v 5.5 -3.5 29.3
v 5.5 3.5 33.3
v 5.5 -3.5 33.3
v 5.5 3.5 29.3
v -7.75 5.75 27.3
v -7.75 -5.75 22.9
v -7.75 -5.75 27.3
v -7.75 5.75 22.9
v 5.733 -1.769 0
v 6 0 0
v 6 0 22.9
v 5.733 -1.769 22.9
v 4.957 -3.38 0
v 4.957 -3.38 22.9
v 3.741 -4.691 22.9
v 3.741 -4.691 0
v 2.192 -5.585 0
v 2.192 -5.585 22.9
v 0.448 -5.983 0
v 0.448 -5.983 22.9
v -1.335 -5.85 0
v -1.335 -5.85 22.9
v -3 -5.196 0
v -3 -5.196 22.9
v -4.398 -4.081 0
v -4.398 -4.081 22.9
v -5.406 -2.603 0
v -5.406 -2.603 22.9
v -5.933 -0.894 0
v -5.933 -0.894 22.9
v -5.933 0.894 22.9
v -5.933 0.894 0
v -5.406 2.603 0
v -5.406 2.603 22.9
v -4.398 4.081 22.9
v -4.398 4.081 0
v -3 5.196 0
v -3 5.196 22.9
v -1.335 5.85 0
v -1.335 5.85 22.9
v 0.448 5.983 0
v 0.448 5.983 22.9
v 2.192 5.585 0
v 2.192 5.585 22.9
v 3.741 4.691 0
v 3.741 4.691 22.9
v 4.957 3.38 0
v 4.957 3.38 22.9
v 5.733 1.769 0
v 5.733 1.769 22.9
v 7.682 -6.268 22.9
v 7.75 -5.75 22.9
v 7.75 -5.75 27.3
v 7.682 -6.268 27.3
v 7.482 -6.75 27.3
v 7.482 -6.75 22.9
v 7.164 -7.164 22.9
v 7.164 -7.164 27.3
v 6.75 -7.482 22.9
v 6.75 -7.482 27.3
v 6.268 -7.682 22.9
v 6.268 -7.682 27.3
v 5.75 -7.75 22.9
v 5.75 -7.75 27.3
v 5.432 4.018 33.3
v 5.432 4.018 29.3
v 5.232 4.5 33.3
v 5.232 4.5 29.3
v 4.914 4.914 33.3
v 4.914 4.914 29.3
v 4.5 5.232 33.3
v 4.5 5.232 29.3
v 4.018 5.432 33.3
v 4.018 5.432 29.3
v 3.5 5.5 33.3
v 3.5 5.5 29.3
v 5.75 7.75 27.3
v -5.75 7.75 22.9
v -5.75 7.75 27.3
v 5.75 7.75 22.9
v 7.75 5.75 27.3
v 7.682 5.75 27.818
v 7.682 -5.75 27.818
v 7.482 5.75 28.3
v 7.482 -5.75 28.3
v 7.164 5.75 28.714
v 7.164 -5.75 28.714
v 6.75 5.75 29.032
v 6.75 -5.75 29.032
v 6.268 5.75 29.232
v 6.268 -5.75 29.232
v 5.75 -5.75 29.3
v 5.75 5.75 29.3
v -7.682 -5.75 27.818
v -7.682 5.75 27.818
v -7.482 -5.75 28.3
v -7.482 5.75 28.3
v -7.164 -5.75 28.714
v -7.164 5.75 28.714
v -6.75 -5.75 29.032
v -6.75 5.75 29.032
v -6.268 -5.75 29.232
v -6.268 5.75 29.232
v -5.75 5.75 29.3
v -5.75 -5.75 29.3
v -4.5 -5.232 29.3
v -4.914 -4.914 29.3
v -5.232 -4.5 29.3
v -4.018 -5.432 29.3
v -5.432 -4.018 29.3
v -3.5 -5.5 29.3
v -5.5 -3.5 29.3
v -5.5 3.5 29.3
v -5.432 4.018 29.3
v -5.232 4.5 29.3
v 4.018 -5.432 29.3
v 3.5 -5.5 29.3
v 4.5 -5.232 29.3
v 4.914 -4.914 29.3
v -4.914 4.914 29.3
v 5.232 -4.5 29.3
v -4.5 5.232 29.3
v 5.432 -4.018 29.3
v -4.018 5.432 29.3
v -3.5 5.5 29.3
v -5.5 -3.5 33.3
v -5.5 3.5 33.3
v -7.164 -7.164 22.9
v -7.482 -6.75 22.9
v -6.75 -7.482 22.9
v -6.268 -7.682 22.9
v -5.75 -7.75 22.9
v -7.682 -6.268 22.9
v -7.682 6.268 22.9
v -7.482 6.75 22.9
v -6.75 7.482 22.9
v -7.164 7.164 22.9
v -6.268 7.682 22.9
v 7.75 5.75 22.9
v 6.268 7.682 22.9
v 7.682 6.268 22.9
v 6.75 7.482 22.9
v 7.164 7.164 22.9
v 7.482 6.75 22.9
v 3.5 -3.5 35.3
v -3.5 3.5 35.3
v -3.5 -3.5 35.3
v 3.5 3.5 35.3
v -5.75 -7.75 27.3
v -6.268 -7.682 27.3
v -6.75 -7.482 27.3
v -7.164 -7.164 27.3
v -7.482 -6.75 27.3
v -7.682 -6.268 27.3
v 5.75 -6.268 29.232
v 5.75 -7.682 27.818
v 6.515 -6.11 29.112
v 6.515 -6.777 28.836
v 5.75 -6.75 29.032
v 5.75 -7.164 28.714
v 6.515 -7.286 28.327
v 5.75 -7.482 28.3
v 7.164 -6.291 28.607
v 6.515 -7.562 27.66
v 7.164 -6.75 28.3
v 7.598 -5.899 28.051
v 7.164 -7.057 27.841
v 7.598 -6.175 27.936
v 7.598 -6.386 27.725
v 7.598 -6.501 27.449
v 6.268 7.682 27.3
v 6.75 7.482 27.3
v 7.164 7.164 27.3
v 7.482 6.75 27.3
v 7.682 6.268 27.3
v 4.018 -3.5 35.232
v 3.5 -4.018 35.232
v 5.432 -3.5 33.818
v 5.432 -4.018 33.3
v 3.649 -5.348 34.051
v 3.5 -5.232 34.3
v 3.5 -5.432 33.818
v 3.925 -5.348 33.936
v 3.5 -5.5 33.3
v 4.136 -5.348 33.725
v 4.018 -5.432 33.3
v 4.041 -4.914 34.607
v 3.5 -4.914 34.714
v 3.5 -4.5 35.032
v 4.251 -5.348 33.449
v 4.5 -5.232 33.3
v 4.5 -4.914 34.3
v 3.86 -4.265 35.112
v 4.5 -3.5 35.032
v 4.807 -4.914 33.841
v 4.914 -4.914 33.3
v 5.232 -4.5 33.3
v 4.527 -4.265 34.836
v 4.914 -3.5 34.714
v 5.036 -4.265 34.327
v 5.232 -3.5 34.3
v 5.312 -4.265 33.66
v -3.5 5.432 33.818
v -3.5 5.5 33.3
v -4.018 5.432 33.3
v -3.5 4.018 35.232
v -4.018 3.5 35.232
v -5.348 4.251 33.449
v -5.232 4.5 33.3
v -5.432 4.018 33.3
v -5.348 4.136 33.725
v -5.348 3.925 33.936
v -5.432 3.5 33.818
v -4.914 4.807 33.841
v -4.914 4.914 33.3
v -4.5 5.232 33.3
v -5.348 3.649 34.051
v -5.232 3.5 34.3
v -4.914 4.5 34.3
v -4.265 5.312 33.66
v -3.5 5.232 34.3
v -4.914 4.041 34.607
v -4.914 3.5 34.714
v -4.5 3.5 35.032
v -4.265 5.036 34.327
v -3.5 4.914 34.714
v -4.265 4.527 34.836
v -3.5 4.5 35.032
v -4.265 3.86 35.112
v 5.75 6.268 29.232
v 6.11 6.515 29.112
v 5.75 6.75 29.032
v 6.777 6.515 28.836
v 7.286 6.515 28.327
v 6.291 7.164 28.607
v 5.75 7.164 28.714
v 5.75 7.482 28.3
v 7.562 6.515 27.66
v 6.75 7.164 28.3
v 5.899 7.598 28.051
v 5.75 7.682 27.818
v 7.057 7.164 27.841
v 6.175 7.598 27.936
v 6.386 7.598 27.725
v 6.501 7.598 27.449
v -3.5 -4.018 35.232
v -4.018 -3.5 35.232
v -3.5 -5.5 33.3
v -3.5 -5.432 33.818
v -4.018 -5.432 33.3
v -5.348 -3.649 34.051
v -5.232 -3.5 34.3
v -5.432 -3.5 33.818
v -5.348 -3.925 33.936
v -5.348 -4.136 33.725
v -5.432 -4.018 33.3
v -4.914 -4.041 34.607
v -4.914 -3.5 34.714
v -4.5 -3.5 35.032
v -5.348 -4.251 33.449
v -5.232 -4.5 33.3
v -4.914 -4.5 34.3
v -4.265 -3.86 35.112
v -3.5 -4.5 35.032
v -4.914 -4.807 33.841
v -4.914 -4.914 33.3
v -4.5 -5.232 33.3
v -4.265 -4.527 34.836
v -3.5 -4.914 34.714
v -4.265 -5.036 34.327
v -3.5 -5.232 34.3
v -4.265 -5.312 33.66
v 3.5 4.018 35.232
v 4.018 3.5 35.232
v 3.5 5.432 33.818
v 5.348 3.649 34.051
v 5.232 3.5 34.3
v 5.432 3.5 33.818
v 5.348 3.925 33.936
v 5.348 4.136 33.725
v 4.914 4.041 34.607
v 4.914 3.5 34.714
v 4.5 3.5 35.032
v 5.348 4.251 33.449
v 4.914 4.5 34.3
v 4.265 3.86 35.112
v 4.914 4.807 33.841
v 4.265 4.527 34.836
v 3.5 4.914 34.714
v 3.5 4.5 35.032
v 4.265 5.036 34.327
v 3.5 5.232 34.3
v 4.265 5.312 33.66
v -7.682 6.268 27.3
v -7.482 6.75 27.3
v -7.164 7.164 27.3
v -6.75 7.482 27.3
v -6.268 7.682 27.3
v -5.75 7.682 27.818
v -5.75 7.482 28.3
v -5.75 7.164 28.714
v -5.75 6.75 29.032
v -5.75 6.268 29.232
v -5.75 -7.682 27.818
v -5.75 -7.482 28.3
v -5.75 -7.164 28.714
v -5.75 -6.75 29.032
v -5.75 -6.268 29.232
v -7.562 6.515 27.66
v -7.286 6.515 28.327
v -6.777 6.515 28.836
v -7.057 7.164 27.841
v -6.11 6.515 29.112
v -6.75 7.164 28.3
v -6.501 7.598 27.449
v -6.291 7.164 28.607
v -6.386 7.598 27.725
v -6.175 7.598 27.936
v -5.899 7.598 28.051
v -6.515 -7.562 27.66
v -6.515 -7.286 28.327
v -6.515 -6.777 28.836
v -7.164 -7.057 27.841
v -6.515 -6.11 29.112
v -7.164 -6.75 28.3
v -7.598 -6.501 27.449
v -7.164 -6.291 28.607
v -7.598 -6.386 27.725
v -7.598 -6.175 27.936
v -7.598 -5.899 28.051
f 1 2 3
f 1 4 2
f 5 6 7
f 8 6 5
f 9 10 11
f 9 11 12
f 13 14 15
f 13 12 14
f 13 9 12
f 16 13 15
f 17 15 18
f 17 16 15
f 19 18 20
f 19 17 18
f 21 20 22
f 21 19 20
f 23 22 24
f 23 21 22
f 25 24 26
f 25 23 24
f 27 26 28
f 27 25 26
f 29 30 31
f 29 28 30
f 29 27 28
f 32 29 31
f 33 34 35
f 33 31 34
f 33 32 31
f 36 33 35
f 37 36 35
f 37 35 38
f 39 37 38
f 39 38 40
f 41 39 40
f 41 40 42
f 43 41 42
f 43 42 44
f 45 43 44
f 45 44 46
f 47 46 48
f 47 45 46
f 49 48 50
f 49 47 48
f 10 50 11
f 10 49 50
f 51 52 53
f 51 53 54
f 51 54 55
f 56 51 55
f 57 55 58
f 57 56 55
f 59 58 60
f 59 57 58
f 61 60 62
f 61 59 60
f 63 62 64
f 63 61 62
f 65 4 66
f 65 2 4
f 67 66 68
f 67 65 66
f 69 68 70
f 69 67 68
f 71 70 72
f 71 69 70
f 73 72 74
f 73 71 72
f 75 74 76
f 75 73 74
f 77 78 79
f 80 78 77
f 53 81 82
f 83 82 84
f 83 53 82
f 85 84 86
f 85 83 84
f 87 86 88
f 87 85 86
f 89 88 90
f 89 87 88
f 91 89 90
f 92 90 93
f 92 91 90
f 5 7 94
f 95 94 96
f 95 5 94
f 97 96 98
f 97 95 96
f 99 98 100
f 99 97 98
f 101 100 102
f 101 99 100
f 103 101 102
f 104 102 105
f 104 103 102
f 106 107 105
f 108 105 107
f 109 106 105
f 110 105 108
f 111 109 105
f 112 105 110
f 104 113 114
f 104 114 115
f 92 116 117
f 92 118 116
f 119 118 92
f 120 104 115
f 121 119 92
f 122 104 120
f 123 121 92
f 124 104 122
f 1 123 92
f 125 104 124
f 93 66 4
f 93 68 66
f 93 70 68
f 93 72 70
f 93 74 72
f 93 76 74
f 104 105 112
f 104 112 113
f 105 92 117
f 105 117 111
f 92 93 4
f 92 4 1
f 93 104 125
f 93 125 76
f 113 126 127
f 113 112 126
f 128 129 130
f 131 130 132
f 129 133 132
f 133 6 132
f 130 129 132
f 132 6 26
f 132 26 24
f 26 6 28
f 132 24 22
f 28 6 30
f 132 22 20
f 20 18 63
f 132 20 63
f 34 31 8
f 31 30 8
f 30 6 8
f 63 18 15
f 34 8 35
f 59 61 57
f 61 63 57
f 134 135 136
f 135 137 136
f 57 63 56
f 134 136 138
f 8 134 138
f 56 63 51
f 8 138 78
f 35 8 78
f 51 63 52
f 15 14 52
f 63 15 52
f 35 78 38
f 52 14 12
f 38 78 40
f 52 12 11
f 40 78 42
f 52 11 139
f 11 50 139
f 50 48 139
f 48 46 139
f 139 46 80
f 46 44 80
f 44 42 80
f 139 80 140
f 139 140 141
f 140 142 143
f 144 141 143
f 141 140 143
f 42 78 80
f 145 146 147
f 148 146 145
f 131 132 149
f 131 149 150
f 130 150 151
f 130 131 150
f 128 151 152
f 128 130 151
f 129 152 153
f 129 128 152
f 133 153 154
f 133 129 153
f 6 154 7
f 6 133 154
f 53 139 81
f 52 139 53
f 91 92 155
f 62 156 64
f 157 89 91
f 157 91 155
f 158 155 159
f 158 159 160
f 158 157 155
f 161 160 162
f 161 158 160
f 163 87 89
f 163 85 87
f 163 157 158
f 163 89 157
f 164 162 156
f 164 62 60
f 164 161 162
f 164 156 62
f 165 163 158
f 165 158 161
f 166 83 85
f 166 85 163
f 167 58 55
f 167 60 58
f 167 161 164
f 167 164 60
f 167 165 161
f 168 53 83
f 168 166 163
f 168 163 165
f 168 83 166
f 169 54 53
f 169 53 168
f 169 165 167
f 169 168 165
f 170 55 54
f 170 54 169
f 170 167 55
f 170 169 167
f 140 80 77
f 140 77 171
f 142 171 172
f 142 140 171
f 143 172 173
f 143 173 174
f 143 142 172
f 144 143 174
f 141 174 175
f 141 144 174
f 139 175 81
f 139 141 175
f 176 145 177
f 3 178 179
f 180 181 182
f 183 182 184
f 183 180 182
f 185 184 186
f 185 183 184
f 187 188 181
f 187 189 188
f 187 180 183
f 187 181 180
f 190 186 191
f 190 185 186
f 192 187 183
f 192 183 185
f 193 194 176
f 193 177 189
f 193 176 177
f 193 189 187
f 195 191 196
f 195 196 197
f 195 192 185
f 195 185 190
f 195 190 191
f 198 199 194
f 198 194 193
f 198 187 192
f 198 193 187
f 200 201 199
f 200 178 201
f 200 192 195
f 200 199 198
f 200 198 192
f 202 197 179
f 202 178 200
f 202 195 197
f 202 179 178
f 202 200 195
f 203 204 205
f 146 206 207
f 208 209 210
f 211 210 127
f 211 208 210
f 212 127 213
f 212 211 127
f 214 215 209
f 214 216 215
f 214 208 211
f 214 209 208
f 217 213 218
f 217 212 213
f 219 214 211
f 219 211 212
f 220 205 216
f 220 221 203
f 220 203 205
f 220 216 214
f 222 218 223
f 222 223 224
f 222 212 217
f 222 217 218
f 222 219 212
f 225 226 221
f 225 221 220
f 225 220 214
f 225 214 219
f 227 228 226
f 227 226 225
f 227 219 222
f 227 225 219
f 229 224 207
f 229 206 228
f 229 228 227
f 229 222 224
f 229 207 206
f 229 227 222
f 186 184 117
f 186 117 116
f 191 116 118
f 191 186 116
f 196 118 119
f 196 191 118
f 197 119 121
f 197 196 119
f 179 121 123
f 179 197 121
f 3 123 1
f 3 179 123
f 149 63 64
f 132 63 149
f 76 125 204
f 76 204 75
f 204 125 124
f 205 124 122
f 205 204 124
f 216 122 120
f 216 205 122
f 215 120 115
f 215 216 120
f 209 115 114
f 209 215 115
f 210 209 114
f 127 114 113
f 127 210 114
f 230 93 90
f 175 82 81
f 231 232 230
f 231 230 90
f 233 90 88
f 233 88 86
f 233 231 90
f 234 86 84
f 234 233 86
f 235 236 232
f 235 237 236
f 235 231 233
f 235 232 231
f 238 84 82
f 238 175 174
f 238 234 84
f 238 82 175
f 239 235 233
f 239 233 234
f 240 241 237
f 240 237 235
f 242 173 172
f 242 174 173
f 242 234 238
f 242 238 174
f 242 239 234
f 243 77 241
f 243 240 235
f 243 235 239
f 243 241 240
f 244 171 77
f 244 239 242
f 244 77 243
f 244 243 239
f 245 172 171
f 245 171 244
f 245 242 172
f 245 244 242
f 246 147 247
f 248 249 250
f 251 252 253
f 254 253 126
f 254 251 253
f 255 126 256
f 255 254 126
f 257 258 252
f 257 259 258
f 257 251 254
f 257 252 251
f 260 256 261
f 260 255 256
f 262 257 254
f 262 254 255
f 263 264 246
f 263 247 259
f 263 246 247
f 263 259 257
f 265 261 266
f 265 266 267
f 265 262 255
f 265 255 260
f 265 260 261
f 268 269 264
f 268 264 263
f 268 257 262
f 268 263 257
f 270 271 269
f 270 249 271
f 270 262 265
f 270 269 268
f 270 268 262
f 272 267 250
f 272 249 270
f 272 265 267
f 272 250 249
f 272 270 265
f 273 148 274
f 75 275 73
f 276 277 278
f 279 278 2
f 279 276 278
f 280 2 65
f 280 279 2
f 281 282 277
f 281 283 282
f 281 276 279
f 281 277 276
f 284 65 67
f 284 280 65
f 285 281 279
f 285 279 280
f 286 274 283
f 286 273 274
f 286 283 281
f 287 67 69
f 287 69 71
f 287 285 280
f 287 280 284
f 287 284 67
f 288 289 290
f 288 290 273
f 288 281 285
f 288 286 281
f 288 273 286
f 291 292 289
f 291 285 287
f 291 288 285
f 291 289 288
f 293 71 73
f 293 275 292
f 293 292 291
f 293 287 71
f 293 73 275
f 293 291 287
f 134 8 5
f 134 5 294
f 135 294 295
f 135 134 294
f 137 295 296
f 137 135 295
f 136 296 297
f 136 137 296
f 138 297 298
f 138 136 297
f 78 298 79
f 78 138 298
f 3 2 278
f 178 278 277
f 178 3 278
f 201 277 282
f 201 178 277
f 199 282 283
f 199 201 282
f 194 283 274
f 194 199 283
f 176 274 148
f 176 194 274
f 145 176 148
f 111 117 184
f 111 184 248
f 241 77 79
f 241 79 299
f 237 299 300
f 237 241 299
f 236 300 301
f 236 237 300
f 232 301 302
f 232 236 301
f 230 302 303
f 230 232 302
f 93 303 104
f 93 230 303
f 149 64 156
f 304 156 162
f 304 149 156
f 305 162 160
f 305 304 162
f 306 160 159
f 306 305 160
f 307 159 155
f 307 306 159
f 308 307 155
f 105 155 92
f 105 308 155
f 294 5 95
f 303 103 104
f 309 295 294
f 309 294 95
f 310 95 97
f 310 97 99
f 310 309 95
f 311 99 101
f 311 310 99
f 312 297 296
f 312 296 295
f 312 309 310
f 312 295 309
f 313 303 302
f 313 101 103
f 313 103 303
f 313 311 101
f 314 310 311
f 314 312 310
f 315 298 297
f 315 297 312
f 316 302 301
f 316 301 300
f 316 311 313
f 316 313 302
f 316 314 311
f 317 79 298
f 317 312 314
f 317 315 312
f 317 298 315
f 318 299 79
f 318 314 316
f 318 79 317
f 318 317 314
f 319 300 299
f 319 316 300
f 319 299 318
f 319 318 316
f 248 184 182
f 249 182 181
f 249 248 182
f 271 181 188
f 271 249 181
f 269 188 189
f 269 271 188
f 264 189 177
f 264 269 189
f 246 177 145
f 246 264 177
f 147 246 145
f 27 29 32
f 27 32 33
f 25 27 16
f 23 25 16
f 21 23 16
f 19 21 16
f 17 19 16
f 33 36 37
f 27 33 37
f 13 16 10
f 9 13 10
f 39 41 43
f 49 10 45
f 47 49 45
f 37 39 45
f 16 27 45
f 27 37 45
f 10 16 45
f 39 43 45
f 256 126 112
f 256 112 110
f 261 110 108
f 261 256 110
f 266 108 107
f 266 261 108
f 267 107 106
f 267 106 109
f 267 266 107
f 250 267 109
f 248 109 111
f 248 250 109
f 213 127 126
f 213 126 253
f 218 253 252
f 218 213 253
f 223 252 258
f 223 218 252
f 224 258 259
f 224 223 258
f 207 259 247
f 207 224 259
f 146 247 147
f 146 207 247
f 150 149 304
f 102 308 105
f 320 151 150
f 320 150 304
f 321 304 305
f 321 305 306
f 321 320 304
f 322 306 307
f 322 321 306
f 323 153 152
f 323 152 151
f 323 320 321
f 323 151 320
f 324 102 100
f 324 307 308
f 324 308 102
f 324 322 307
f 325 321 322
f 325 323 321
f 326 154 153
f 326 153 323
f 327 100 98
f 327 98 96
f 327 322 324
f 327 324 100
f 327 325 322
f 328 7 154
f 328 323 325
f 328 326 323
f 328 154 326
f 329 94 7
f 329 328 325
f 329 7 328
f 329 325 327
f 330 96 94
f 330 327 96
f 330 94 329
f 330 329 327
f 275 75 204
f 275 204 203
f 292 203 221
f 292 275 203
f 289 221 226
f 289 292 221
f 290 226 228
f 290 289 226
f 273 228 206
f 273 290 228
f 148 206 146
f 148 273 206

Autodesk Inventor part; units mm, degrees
ref_plane "YZ Plane" through (0, 0, 0) normal (1, 0, 0) x (0, 1, 0)
ref_plane "XZ Plane" through (0, 0, 0) normal (0, 1, 0) x (-1, 0, 0)
ref_plane "XY Plane" through (0, 0, 0) normal (0, 0, 1) x (1, 0, 0)
sketch "Sketch1" plane through (0, 0, 0) normal (0, 0, 1) x (1, 0, 0)
  circle A0 centre (0, 0) radius 6
  dimension "d0" = 12
extrude "Extrusion1" add sketch "Sketch1" along normal blind 22.9
sketch "Sketch2" plane through (0, 0, 22.9) normal (0, 0, 1) x (1, 0, 0)
  line L0 (-7.75, 7.75) -> (7.75, 7.75)
  line L1 (7.75, 7.75) -> (7.75, -7.75)
  line L2 (7.75, -7.75) -> (-7.75, -7.75)
  line L3 (-7.75, -7.75) -> (-7.75, 7.75)
  line L4 (-7.75, 7.75) -> (7.75, -7.75) construction
  line L5 (7.75, 7.75) -> (-7.75, -7.75) construction
  point P0 (0, 0)
  dimension "d3" = 15.5
  dimension "d4" = 15.5
extrude "Extrusion2" add sketch "Sketch2" along normal blind 6.4
sketch "Sketch3" plane through (0, 0, 29.3) normal (0, 0, 1) x (1, 0, 0)
  line L0 (-5.5, 5.5) -> (5.5, 5.5)
  line L1 (5.5, 5.5) -> (5.5, -5.5)
  line L2 (5.5, -5.5) -> (-5.5, -5.5)
  line L3 (-5.5, -5.5) -> (-5.5, 5.5)
  line L4 (-5.5, 5.5) -> (5.5, -5.5) construction
  line L5 (5.5, 5.5) -> (-5.5, -5.5) construction
  point P0 (0, 0)
  dimension "d7" = 11
  dimension "d8" = 11
extrude "Extrusion3" add sketch "Sketch3" along normal blind 6
fillet "Fillet1" radius 2 12 edges at (0, 5.5, 35.3) (5.5, 5.5, 32.3) (5.5, 0, 35.3) (0, -5.5, 35.3) (5.5, -5.5, 32.3) (-5.5, 0, 35.3) (-5.5, 5.5, 32.3) (-5.5, -5.5, 32.3) (-7.75, 0, 29.3) (0, -7.75, 29.3) (7.75, 0, 29.3) (0, 7.75, 29.3)
fillet "Fillet2" radius 2 8 edges at (7.1642, -7.1642, 28.7142) (7.75, -7.75, 25.1) (-7.1642, -7.1642, 28.7142) (-7.75, -7.75, 25.1) (7.1642, 7.1642, 28.7142) (7.75, 7.75, 25.1) (-7.1642, 7.1642, 28.7142) (-7.75, 7.75, 25.1)
properties part number "Power Switch"
